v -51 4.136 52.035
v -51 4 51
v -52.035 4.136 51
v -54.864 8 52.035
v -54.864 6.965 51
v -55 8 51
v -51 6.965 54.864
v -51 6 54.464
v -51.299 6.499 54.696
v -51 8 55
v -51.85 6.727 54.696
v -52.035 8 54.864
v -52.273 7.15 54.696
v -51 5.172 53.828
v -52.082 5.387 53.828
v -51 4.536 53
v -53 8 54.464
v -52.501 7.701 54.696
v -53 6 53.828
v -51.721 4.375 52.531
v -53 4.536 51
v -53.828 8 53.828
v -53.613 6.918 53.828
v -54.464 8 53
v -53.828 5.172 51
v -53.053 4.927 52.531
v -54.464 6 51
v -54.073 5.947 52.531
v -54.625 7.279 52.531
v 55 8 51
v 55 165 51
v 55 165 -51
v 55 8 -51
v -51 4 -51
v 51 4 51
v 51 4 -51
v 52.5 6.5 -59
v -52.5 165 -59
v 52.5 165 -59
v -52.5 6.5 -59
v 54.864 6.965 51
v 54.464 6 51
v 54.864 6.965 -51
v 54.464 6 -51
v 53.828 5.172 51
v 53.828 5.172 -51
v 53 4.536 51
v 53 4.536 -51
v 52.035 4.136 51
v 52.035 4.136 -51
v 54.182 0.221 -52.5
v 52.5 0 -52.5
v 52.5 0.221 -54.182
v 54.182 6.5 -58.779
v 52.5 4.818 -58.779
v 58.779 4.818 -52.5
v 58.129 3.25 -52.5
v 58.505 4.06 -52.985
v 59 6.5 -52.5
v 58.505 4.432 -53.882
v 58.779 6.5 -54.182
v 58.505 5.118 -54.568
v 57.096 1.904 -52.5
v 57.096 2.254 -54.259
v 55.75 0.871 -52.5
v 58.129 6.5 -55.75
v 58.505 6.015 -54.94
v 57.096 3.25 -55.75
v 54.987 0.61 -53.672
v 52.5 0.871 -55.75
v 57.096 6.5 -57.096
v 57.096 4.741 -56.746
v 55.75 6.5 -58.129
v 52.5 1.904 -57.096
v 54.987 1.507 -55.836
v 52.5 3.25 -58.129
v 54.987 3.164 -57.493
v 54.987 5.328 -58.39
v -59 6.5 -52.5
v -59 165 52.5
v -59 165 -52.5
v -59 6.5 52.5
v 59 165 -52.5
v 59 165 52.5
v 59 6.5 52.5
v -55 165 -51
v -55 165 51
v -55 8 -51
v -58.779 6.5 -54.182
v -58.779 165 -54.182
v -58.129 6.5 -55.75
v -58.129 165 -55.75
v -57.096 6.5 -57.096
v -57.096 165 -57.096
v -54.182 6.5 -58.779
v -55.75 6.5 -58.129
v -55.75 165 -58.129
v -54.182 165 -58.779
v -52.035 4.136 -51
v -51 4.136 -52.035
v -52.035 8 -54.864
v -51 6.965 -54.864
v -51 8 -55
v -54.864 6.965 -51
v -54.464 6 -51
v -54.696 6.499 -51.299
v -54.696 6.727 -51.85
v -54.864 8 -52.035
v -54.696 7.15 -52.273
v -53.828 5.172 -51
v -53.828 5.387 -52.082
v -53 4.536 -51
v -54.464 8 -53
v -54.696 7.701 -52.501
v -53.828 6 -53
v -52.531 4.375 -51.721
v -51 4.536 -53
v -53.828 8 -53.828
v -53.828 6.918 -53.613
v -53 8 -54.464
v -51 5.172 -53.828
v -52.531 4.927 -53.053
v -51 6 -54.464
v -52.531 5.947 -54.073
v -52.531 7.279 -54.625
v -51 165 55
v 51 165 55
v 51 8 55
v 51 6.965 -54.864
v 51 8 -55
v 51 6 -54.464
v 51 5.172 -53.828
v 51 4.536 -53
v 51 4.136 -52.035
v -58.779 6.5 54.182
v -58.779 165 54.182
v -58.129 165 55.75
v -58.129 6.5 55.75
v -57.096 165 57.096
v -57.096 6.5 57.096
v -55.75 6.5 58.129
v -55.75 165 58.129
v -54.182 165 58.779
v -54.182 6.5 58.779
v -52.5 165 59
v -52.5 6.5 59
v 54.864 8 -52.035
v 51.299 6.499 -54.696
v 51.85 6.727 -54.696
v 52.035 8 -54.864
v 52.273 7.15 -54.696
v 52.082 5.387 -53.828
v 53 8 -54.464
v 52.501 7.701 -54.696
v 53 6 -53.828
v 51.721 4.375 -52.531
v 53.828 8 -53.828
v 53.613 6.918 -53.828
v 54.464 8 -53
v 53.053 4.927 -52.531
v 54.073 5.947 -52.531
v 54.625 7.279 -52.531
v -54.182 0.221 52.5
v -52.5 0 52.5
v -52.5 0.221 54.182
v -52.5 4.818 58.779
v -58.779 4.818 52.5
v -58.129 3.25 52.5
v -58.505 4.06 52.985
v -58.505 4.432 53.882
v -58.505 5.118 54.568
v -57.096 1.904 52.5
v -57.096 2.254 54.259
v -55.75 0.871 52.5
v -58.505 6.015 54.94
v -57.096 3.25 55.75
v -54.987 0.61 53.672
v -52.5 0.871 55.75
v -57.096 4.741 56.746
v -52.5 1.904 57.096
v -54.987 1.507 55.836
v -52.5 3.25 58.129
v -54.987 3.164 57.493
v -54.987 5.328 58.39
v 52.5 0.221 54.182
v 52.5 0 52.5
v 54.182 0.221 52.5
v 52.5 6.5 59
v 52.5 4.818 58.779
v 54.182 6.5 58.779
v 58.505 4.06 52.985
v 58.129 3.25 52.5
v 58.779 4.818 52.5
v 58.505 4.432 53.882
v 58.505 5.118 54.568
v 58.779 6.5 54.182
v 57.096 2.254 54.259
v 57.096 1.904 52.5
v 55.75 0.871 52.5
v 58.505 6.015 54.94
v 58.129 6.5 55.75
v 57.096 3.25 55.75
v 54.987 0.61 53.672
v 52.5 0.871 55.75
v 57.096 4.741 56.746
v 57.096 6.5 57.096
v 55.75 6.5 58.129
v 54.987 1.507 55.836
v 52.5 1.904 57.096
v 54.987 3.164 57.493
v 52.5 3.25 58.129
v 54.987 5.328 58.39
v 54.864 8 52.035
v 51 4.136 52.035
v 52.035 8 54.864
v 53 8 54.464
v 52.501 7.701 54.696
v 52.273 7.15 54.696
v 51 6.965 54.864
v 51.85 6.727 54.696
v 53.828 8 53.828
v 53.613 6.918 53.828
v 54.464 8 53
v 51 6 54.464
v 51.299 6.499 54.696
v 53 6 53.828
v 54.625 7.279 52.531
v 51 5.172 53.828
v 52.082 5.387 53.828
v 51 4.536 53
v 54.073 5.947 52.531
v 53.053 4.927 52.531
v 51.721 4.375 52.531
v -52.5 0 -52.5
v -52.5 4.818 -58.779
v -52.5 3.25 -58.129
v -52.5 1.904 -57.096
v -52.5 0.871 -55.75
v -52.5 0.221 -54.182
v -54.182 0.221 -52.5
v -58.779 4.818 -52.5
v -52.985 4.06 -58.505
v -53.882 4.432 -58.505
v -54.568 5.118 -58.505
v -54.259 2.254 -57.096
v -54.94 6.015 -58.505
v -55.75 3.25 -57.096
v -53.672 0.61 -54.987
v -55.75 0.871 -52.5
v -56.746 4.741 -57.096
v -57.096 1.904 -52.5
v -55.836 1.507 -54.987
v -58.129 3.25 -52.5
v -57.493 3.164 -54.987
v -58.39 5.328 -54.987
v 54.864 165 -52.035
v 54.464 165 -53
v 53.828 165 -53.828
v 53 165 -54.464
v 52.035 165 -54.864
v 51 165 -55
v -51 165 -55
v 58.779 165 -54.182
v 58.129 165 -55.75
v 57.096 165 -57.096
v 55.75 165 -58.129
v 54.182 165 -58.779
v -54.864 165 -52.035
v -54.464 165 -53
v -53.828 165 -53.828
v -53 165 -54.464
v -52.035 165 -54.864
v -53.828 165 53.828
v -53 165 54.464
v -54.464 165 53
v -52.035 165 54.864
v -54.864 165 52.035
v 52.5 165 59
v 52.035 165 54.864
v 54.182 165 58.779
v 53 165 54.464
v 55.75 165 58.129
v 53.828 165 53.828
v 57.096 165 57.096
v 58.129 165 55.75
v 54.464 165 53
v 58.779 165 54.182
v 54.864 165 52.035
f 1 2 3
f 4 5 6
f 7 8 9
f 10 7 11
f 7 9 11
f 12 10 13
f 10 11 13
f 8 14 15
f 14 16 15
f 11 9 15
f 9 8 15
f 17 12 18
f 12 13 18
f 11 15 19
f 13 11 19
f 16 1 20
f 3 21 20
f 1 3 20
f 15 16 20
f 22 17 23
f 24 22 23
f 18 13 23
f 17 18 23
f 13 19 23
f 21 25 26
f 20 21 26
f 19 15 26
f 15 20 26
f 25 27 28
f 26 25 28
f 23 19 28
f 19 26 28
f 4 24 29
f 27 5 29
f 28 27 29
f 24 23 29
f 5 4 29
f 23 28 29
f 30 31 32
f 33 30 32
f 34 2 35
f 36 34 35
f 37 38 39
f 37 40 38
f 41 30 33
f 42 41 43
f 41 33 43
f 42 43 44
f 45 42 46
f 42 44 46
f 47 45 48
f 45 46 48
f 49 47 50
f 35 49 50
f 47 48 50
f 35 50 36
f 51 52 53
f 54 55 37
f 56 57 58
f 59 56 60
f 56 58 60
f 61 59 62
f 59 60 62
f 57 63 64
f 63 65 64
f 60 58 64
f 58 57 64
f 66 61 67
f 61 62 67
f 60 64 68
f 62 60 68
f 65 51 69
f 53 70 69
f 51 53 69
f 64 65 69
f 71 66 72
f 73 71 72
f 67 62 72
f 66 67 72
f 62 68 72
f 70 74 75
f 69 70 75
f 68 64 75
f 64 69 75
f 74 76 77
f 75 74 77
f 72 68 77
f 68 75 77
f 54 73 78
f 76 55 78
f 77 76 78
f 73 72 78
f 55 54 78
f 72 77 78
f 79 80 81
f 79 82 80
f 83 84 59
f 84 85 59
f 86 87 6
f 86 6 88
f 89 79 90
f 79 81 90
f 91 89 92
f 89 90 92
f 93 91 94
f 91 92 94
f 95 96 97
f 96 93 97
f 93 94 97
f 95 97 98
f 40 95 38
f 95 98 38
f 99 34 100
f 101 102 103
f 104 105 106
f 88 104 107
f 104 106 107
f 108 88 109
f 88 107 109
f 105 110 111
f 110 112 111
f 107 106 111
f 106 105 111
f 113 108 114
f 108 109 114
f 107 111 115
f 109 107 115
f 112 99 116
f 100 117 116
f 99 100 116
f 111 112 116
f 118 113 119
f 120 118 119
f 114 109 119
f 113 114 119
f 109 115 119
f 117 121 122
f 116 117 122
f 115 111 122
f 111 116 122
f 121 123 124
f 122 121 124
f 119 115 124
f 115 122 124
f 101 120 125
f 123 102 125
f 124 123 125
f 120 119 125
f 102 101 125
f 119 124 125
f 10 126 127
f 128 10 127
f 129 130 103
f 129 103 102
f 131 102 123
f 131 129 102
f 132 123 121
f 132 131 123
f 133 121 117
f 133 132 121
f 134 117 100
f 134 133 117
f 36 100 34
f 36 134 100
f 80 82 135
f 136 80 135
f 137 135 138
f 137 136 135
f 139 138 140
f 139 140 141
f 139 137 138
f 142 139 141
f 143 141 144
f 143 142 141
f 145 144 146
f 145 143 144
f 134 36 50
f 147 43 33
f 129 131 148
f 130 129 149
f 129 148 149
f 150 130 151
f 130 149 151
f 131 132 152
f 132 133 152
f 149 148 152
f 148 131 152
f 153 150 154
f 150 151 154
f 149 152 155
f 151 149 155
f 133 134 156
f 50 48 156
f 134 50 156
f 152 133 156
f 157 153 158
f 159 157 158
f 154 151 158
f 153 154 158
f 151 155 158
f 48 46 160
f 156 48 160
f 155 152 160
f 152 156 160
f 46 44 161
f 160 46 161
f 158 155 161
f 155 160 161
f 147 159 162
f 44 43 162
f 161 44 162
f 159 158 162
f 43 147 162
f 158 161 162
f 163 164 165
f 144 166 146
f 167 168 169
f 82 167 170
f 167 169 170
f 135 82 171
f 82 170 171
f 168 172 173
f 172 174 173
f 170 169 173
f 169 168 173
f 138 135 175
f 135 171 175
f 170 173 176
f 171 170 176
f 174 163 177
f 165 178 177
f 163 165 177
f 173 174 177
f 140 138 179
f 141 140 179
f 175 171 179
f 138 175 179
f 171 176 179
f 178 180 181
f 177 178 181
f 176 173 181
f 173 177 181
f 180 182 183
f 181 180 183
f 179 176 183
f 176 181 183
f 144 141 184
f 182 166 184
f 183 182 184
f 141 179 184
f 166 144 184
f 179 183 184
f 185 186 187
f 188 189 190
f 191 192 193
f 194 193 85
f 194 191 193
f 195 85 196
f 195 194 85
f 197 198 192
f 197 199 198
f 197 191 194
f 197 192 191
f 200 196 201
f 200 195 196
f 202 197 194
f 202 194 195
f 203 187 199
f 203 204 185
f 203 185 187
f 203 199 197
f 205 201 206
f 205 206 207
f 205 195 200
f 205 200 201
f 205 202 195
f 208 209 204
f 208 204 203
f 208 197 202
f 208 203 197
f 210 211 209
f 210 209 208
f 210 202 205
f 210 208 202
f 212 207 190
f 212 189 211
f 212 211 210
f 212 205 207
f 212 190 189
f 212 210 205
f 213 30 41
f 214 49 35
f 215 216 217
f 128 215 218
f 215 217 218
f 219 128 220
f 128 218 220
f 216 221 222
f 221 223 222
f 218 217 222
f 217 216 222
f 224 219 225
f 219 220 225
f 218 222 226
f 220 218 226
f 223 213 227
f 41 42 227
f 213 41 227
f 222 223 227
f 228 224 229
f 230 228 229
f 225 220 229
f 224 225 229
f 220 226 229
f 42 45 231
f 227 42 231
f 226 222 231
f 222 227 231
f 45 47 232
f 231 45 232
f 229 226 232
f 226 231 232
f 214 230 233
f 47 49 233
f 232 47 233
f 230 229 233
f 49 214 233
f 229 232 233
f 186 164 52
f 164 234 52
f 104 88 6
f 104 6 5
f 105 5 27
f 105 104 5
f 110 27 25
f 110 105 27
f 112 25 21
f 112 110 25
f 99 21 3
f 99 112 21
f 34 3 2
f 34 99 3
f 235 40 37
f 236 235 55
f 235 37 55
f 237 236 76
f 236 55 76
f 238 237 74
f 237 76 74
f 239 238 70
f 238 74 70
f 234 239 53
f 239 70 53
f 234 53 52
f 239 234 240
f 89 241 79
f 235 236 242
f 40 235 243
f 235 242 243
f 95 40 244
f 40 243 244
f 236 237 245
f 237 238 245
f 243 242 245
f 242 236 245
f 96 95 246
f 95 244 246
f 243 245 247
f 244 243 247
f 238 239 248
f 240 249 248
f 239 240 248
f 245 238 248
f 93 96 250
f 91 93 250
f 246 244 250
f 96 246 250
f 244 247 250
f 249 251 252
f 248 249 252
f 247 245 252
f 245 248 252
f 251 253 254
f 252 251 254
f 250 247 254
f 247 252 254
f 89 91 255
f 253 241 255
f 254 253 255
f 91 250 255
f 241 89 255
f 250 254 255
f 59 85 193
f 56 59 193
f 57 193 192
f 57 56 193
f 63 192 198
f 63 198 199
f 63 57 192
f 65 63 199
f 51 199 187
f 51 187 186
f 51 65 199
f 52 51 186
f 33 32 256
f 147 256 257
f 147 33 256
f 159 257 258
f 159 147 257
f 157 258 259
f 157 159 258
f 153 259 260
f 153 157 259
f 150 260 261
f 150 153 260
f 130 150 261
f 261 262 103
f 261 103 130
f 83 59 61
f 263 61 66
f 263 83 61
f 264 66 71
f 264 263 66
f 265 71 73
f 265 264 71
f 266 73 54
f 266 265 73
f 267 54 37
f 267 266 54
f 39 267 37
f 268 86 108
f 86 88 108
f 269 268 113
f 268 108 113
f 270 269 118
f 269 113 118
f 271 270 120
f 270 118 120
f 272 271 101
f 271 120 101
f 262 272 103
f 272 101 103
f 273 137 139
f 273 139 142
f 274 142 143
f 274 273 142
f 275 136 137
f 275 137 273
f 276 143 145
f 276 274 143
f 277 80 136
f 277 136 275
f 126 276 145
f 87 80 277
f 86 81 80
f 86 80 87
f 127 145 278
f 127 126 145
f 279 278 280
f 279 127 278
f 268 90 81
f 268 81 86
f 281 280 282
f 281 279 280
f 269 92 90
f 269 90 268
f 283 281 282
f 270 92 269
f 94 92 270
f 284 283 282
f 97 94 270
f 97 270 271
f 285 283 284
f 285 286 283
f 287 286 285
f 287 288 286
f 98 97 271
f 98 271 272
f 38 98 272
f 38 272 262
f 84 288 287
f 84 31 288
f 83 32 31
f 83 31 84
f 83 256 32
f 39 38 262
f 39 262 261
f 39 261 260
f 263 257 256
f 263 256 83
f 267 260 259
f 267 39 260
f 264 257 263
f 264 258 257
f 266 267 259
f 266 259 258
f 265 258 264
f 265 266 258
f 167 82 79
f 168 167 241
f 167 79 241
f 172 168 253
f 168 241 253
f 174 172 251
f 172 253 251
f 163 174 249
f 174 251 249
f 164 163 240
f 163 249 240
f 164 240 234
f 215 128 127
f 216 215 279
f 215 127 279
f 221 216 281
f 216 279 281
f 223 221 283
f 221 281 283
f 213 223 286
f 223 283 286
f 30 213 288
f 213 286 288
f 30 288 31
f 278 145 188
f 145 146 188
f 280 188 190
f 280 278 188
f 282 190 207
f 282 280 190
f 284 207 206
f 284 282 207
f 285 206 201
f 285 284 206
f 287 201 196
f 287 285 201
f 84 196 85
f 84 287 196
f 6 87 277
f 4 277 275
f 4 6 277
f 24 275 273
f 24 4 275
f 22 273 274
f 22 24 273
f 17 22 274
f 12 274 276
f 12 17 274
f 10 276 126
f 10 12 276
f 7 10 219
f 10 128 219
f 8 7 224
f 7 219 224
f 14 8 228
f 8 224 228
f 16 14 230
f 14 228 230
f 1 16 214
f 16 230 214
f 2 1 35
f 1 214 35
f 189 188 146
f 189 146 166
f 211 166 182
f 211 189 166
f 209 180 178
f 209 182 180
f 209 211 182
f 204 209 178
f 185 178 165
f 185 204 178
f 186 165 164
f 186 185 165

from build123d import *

# Parameters (mm, degrees)
SKETCH1_W           = 118
SKETCH1_H           = 118
BOSS_EXTRUDE1_DEPTH = 165
SHELL1_T            = -4
FILLET1_R           = 4
FILLET2_R           = 6.5


with BuildPart() as part:
    # Sketch1 → Boss-Extrude1 (new body)
    with BuildSketch(Plane(origin=(0, 0, 0), x_dir=(1, 0, 0), z_dir=(0, 1, 0))):
        Rectangle(SKETCH1_W, SKETCH1_H)
    extrude(amount=BOSS_EXTRUDE1_DEPTH)

    # Shell1
    shell1_openings = [part.faces().sort_by_distance(p)[0] for p in [
        (0, 165, 0),
    ]]
    offset(amount=SHELL1_T, openings=shell1_openings, kind=Kind.INTERSECTION)

    # Fillet1
    fillet1_edges = [part.edges().sort_by_distance(p)[0] for p in [
        (55, 4, 0),
        (55, 84.5, 55),
        (0, 4, -55),
        (55, 84.5, -55),
        (-55, 4, 0),
        (-55, 84.5, -55),
        (0, 4, 55),
        (-55, 84.5, 55),
    ]]
    fillet(fillet1_edges, radius=FILLET1_R)

    # Fillet2
    fillet2_edges = [part.edges().sort_by_distance(p)[0] for p in [
        (0, 0, 59),
        (-59, 0, 0),
        (0, 0, -59),
        (59, 0, 0),
        (59, 82.5, 59),
        (-59, 82.5, 59),
        (-59, 82.5, -59),
        (59, 82.5, -59),
    ]]
    fillet(fillet2_edges, radius=FILLET2_R)


solid = part.part
